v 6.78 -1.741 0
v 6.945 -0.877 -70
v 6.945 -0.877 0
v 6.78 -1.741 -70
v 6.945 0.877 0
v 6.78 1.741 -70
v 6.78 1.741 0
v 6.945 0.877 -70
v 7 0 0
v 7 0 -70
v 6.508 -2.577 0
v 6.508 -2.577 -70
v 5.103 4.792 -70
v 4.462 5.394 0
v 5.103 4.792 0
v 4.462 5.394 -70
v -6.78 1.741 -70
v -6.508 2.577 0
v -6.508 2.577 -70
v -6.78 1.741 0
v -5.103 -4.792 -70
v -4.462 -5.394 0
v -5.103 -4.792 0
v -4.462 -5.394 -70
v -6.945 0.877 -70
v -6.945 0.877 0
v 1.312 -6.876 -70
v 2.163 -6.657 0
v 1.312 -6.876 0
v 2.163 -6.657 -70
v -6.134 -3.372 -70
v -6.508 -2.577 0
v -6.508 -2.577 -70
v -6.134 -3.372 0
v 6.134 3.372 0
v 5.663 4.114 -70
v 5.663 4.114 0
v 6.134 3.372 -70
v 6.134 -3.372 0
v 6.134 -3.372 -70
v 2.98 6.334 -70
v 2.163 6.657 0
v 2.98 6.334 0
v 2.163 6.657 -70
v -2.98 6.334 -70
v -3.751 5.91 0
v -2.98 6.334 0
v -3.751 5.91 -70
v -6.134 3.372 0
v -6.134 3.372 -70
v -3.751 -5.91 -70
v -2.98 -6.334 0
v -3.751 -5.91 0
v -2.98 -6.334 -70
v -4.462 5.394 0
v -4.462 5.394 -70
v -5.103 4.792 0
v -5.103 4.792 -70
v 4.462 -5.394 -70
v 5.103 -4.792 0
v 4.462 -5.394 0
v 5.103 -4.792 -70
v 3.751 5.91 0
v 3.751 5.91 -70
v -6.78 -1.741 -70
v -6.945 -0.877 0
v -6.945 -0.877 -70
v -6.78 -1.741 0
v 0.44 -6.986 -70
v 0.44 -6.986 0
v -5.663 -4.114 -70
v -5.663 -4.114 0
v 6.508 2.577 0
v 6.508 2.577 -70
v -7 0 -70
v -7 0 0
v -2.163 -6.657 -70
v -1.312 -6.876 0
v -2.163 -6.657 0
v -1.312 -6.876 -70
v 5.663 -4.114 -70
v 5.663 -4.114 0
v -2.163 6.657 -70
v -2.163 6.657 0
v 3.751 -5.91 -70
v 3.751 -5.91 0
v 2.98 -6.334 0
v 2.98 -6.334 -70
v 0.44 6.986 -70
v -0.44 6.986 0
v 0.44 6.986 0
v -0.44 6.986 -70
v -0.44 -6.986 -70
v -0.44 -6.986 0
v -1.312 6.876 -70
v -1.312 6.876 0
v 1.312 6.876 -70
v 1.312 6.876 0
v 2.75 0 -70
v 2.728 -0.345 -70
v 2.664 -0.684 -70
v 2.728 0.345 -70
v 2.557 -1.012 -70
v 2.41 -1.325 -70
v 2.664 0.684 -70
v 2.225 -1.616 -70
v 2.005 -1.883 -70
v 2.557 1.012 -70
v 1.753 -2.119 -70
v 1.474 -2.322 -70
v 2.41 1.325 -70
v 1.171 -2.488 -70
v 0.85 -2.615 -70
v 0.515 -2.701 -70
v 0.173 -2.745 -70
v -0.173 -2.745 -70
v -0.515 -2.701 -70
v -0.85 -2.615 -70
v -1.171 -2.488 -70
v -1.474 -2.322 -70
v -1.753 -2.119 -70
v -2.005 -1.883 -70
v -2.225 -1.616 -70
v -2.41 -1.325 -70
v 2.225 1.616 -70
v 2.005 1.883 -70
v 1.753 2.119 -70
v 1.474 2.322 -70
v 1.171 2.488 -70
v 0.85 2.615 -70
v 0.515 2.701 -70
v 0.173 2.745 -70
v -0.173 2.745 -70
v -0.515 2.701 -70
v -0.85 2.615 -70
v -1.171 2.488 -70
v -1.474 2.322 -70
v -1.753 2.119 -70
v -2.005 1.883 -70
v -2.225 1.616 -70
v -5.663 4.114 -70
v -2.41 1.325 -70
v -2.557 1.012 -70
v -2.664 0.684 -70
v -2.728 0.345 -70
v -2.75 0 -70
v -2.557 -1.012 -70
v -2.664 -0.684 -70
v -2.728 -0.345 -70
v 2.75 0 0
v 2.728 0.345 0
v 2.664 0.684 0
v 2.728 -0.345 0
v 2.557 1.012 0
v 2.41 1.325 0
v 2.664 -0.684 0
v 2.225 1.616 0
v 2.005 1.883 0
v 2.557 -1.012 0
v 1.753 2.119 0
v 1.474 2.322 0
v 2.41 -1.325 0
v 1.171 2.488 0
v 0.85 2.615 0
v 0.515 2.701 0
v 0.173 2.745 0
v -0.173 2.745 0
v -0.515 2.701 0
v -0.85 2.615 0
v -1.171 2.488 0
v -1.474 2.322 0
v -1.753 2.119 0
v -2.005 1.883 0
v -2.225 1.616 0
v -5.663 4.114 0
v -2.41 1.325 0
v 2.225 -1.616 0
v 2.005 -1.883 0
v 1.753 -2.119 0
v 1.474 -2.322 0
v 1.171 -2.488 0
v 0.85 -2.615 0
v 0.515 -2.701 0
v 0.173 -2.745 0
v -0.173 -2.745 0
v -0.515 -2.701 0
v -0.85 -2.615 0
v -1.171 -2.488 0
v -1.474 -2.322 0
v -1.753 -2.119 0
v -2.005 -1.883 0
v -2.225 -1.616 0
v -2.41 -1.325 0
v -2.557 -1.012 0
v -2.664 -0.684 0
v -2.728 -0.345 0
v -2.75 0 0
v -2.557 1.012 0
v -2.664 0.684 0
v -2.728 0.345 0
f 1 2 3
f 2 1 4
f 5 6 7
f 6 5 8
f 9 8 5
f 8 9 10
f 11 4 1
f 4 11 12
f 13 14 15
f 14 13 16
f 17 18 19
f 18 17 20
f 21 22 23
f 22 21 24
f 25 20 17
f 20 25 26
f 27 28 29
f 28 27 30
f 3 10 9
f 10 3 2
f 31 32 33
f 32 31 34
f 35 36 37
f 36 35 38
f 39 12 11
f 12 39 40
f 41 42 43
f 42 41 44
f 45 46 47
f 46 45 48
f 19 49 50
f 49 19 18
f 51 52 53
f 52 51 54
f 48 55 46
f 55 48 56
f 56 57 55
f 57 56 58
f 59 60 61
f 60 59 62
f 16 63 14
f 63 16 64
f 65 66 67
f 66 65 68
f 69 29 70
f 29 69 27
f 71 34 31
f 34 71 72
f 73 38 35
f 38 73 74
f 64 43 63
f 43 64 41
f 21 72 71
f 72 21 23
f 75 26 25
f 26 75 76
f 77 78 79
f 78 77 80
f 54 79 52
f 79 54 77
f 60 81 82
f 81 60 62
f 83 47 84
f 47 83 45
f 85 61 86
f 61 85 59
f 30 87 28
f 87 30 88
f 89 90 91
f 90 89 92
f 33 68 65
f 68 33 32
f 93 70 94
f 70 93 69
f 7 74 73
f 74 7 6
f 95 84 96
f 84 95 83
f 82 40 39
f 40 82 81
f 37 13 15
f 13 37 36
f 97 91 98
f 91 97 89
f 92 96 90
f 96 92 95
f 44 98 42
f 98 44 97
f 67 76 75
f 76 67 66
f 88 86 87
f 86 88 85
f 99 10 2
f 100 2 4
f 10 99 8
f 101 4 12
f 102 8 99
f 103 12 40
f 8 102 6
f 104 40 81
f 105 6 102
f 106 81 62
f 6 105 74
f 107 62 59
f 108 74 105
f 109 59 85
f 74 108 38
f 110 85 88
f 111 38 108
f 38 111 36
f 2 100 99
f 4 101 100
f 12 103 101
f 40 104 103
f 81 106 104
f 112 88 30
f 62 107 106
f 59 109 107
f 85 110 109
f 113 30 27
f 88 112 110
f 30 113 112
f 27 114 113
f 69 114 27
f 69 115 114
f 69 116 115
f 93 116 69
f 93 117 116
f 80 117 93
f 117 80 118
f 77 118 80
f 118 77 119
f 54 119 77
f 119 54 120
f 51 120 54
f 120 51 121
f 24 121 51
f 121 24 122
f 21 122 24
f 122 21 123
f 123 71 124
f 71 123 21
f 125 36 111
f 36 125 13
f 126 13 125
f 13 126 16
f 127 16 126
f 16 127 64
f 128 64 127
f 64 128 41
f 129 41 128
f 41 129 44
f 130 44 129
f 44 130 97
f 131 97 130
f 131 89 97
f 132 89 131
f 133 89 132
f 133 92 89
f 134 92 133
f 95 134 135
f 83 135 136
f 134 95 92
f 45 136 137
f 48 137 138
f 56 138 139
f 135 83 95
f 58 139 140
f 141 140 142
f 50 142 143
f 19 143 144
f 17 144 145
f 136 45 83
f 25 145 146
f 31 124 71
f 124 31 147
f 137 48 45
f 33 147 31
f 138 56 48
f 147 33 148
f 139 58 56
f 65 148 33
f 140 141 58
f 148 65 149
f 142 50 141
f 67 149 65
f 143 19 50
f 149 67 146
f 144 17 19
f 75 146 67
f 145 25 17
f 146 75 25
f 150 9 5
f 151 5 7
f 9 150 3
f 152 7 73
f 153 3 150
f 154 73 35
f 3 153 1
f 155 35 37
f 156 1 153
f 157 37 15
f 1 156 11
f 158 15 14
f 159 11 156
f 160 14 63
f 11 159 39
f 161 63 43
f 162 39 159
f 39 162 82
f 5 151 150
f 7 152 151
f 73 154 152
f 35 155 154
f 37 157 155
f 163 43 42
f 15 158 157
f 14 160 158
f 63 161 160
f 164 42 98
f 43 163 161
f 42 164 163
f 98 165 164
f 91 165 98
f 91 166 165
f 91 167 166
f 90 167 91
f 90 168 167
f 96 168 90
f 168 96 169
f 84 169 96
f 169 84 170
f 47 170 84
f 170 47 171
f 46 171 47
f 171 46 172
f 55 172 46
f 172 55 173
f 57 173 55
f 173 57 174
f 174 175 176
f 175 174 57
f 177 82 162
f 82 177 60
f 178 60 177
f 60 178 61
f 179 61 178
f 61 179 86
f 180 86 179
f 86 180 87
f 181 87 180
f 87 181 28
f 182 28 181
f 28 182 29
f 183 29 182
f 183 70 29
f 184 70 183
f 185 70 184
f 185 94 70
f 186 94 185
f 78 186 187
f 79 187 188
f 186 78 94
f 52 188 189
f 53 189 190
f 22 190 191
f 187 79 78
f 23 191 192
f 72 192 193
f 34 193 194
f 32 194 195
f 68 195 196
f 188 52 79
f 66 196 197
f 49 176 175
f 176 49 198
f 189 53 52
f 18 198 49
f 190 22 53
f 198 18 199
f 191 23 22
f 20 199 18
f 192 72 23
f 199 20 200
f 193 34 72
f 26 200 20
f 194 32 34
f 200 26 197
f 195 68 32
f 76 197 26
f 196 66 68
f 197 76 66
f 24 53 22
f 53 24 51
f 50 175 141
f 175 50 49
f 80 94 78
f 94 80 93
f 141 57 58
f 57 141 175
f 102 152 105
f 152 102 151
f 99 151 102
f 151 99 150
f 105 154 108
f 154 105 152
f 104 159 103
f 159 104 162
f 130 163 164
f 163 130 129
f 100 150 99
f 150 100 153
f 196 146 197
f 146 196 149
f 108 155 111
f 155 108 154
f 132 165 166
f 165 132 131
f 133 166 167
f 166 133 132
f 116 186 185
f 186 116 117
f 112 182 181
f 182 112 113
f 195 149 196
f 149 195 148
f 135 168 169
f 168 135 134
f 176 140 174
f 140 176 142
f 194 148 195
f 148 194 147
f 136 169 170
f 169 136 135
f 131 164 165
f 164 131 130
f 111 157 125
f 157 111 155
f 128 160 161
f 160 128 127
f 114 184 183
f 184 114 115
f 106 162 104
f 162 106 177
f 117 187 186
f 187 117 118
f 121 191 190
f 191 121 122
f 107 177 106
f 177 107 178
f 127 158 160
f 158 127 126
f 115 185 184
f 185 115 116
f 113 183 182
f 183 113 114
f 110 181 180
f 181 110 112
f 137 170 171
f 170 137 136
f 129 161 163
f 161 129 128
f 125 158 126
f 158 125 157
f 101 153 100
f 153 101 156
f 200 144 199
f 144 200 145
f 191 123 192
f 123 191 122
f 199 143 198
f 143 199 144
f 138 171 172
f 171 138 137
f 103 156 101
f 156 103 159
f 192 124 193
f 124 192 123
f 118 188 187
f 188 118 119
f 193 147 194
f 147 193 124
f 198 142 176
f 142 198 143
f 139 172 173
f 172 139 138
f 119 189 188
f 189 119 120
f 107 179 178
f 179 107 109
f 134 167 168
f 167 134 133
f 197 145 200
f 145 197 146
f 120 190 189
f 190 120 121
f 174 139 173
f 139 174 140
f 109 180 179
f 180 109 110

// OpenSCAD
$fn = 50;


difference() {
	union() {
		translate(v = [0, 0, -70.0000000000]) {
			cylinder(h = 70, r = 7.0000000000);
		}
	}
	union() {
		#translate(v = [0, 0, -70]) {
			cylinder(h = 70, r = 2.7500000000);
		}
	}
}
